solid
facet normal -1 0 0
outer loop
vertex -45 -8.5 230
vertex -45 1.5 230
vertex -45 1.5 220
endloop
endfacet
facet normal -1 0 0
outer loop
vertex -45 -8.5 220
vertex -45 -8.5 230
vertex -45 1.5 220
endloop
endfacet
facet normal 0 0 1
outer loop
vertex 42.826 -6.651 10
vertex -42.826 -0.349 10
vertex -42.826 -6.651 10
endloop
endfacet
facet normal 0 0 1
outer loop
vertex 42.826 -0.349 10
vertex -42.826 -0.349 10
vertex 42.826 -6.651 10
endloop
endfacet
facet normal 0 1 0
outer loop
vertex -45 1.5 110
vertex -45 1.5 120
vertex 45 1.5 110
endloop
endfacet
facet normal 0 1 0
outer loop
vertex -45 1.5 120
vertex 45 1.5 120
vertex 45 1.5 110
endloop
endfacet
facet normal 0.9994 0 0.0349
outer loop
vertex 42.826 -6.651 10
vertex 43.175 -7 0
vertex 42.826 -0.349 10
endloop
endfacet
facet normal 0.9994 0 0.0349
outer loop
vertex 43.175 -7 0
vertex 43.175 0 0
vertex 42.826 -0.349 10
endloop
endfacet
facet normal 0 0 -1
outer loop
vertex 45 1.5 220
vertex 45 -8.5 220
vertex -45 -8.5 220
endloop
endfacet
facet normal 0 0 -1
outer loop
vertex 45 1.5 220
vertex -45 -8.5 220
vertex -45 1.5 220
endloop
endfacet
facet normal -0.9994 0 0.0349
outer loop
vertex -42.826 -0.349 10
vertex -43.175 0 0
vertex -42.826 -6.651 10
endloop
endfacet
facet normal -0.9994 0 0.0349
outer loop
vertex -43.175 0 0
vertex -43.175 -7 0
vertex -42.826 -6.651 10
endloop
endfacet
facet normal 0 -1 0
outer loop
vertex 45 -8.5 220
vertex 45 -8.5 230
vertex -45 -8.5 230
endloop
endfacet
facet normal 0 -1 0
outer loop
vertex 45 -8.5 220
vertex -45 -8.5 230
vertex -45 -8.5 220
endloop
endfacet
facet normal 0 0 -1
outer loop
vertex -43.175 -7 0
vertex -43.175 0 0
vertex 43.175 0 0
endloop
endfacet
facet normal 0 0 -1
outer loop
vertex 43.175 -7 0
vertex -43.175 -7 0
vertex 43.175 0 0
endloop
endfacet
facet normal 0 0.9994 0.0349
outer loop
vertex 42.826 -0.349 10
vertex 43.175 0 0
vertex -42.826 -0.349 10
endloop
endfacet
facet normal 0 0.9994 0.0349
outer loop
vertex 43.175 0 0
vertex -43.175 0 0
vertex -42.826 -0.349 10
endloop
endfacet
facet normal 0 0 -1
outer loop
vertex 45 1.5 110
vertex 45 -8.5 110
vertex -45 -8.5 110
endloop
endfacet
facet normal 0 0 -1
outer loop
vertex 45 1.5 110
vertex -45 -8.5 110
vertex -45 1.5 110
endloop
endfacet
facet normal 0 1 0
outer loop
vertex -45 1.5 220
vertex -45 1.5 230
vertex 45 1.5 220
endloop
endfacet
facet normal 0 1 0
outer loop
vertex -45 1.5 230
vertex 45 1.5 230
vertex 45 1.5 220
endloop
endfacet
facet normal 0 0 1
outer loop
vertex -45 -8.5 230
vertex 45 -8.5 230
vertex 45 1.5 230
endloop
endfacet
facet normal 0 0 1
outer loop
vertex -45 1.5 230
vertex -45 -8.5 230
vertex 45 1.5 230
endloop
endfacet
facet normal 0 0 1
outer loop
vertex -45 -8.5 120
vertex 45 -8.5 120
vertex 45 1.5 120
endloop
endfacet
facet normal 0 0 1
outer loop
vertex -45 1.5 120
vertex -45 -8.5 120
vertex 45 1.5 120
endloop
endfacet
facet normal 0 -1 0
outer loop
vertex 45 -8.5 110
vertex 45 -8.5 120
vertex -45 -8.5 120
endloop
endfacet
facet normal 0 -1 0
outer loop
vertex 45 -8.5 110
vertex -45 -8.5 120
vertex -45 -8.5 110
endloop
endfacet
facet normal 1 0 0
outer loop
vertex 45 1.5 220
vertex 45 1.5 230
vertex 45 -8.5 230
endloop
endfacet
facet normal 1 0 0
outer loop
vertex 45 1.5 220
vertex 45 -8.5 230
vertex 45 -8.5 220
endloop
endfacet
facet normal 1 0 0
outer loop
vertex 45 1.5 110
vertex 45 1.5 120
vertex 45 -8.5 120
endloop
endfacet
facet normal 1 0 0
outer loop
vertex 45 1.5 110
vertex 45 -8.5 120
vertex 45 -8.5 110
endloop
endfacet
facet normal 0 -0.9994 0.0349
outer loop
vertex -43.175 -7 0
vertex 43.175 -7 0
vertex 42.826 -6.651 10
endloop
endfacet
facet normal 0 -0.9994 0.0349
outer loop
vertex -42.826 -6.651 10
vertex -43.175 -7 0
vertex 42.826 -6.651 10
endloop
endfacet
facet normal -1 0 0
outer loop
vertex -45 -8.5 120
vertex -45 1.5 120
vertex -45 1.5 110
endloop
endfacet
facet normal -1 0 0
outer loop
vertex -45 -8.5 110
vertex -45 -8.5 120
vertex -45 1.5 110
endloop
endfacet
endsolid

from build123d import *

# Parameters (mm, degrees)
SKETCH1_W             = 86.35
SKETCH1_H             = 7
BOSS_EXTRUDE1_DEPTH   = 10
BOSS_EXTRUDE1_TAPER   = 2
SKETCH2_W             = 10
SKETCH2_H             = 10
BOSS_EXTRUDE2_DEPTH   = 45
BOSS_EXTRUDE2_2_DEPTH = 45


with BuildPart() as part:
    # Sketch1 → Boss-Extrude1 (new body)
    with BuildSketch(Plane.XY):
        with Locations((0, -3.5)):
            Rectangle(SKETCH1_W, SKETCH1_H)
    extrude(amount=BOSS_EXTRUDE1_DEPTH, taper=BOSS_EXTRUDE1_TAPER)


with BuildPart() as body_2:
    # Sketch2 → Boss-Extrude2 (new, symmetric)
    with BuildSketch(Plane(origin=(0, 0, 0), x_dir=(0, 0, -1), z_dir=(1, 0, 0))):
        with Locations((-115, -3.5)):
            Rectangle(SKETCH2_W, SKETCH2_H)
    extrude(amount=BOSS_EXTRUDE2_DEPTH, both=True)


with BuildPart() as body_3:
    # Sketch2 → Boss-Extrude2 2 (new, symmetric)
    with BuildSketch(Plane(origin=(0, 0, 0), x_dir=(0, 0, -1), z_dir=(1, 0, 0))):
        with Locations((-225, -3.5)):
            Rectangle(SKETCH2_W, SKETCH2_H)
    extrude(amount=BOSS_EXTRUDE2_2_DEPTH, both=True)


solid = Compound([part.part, body_2.part, body_3.part])
